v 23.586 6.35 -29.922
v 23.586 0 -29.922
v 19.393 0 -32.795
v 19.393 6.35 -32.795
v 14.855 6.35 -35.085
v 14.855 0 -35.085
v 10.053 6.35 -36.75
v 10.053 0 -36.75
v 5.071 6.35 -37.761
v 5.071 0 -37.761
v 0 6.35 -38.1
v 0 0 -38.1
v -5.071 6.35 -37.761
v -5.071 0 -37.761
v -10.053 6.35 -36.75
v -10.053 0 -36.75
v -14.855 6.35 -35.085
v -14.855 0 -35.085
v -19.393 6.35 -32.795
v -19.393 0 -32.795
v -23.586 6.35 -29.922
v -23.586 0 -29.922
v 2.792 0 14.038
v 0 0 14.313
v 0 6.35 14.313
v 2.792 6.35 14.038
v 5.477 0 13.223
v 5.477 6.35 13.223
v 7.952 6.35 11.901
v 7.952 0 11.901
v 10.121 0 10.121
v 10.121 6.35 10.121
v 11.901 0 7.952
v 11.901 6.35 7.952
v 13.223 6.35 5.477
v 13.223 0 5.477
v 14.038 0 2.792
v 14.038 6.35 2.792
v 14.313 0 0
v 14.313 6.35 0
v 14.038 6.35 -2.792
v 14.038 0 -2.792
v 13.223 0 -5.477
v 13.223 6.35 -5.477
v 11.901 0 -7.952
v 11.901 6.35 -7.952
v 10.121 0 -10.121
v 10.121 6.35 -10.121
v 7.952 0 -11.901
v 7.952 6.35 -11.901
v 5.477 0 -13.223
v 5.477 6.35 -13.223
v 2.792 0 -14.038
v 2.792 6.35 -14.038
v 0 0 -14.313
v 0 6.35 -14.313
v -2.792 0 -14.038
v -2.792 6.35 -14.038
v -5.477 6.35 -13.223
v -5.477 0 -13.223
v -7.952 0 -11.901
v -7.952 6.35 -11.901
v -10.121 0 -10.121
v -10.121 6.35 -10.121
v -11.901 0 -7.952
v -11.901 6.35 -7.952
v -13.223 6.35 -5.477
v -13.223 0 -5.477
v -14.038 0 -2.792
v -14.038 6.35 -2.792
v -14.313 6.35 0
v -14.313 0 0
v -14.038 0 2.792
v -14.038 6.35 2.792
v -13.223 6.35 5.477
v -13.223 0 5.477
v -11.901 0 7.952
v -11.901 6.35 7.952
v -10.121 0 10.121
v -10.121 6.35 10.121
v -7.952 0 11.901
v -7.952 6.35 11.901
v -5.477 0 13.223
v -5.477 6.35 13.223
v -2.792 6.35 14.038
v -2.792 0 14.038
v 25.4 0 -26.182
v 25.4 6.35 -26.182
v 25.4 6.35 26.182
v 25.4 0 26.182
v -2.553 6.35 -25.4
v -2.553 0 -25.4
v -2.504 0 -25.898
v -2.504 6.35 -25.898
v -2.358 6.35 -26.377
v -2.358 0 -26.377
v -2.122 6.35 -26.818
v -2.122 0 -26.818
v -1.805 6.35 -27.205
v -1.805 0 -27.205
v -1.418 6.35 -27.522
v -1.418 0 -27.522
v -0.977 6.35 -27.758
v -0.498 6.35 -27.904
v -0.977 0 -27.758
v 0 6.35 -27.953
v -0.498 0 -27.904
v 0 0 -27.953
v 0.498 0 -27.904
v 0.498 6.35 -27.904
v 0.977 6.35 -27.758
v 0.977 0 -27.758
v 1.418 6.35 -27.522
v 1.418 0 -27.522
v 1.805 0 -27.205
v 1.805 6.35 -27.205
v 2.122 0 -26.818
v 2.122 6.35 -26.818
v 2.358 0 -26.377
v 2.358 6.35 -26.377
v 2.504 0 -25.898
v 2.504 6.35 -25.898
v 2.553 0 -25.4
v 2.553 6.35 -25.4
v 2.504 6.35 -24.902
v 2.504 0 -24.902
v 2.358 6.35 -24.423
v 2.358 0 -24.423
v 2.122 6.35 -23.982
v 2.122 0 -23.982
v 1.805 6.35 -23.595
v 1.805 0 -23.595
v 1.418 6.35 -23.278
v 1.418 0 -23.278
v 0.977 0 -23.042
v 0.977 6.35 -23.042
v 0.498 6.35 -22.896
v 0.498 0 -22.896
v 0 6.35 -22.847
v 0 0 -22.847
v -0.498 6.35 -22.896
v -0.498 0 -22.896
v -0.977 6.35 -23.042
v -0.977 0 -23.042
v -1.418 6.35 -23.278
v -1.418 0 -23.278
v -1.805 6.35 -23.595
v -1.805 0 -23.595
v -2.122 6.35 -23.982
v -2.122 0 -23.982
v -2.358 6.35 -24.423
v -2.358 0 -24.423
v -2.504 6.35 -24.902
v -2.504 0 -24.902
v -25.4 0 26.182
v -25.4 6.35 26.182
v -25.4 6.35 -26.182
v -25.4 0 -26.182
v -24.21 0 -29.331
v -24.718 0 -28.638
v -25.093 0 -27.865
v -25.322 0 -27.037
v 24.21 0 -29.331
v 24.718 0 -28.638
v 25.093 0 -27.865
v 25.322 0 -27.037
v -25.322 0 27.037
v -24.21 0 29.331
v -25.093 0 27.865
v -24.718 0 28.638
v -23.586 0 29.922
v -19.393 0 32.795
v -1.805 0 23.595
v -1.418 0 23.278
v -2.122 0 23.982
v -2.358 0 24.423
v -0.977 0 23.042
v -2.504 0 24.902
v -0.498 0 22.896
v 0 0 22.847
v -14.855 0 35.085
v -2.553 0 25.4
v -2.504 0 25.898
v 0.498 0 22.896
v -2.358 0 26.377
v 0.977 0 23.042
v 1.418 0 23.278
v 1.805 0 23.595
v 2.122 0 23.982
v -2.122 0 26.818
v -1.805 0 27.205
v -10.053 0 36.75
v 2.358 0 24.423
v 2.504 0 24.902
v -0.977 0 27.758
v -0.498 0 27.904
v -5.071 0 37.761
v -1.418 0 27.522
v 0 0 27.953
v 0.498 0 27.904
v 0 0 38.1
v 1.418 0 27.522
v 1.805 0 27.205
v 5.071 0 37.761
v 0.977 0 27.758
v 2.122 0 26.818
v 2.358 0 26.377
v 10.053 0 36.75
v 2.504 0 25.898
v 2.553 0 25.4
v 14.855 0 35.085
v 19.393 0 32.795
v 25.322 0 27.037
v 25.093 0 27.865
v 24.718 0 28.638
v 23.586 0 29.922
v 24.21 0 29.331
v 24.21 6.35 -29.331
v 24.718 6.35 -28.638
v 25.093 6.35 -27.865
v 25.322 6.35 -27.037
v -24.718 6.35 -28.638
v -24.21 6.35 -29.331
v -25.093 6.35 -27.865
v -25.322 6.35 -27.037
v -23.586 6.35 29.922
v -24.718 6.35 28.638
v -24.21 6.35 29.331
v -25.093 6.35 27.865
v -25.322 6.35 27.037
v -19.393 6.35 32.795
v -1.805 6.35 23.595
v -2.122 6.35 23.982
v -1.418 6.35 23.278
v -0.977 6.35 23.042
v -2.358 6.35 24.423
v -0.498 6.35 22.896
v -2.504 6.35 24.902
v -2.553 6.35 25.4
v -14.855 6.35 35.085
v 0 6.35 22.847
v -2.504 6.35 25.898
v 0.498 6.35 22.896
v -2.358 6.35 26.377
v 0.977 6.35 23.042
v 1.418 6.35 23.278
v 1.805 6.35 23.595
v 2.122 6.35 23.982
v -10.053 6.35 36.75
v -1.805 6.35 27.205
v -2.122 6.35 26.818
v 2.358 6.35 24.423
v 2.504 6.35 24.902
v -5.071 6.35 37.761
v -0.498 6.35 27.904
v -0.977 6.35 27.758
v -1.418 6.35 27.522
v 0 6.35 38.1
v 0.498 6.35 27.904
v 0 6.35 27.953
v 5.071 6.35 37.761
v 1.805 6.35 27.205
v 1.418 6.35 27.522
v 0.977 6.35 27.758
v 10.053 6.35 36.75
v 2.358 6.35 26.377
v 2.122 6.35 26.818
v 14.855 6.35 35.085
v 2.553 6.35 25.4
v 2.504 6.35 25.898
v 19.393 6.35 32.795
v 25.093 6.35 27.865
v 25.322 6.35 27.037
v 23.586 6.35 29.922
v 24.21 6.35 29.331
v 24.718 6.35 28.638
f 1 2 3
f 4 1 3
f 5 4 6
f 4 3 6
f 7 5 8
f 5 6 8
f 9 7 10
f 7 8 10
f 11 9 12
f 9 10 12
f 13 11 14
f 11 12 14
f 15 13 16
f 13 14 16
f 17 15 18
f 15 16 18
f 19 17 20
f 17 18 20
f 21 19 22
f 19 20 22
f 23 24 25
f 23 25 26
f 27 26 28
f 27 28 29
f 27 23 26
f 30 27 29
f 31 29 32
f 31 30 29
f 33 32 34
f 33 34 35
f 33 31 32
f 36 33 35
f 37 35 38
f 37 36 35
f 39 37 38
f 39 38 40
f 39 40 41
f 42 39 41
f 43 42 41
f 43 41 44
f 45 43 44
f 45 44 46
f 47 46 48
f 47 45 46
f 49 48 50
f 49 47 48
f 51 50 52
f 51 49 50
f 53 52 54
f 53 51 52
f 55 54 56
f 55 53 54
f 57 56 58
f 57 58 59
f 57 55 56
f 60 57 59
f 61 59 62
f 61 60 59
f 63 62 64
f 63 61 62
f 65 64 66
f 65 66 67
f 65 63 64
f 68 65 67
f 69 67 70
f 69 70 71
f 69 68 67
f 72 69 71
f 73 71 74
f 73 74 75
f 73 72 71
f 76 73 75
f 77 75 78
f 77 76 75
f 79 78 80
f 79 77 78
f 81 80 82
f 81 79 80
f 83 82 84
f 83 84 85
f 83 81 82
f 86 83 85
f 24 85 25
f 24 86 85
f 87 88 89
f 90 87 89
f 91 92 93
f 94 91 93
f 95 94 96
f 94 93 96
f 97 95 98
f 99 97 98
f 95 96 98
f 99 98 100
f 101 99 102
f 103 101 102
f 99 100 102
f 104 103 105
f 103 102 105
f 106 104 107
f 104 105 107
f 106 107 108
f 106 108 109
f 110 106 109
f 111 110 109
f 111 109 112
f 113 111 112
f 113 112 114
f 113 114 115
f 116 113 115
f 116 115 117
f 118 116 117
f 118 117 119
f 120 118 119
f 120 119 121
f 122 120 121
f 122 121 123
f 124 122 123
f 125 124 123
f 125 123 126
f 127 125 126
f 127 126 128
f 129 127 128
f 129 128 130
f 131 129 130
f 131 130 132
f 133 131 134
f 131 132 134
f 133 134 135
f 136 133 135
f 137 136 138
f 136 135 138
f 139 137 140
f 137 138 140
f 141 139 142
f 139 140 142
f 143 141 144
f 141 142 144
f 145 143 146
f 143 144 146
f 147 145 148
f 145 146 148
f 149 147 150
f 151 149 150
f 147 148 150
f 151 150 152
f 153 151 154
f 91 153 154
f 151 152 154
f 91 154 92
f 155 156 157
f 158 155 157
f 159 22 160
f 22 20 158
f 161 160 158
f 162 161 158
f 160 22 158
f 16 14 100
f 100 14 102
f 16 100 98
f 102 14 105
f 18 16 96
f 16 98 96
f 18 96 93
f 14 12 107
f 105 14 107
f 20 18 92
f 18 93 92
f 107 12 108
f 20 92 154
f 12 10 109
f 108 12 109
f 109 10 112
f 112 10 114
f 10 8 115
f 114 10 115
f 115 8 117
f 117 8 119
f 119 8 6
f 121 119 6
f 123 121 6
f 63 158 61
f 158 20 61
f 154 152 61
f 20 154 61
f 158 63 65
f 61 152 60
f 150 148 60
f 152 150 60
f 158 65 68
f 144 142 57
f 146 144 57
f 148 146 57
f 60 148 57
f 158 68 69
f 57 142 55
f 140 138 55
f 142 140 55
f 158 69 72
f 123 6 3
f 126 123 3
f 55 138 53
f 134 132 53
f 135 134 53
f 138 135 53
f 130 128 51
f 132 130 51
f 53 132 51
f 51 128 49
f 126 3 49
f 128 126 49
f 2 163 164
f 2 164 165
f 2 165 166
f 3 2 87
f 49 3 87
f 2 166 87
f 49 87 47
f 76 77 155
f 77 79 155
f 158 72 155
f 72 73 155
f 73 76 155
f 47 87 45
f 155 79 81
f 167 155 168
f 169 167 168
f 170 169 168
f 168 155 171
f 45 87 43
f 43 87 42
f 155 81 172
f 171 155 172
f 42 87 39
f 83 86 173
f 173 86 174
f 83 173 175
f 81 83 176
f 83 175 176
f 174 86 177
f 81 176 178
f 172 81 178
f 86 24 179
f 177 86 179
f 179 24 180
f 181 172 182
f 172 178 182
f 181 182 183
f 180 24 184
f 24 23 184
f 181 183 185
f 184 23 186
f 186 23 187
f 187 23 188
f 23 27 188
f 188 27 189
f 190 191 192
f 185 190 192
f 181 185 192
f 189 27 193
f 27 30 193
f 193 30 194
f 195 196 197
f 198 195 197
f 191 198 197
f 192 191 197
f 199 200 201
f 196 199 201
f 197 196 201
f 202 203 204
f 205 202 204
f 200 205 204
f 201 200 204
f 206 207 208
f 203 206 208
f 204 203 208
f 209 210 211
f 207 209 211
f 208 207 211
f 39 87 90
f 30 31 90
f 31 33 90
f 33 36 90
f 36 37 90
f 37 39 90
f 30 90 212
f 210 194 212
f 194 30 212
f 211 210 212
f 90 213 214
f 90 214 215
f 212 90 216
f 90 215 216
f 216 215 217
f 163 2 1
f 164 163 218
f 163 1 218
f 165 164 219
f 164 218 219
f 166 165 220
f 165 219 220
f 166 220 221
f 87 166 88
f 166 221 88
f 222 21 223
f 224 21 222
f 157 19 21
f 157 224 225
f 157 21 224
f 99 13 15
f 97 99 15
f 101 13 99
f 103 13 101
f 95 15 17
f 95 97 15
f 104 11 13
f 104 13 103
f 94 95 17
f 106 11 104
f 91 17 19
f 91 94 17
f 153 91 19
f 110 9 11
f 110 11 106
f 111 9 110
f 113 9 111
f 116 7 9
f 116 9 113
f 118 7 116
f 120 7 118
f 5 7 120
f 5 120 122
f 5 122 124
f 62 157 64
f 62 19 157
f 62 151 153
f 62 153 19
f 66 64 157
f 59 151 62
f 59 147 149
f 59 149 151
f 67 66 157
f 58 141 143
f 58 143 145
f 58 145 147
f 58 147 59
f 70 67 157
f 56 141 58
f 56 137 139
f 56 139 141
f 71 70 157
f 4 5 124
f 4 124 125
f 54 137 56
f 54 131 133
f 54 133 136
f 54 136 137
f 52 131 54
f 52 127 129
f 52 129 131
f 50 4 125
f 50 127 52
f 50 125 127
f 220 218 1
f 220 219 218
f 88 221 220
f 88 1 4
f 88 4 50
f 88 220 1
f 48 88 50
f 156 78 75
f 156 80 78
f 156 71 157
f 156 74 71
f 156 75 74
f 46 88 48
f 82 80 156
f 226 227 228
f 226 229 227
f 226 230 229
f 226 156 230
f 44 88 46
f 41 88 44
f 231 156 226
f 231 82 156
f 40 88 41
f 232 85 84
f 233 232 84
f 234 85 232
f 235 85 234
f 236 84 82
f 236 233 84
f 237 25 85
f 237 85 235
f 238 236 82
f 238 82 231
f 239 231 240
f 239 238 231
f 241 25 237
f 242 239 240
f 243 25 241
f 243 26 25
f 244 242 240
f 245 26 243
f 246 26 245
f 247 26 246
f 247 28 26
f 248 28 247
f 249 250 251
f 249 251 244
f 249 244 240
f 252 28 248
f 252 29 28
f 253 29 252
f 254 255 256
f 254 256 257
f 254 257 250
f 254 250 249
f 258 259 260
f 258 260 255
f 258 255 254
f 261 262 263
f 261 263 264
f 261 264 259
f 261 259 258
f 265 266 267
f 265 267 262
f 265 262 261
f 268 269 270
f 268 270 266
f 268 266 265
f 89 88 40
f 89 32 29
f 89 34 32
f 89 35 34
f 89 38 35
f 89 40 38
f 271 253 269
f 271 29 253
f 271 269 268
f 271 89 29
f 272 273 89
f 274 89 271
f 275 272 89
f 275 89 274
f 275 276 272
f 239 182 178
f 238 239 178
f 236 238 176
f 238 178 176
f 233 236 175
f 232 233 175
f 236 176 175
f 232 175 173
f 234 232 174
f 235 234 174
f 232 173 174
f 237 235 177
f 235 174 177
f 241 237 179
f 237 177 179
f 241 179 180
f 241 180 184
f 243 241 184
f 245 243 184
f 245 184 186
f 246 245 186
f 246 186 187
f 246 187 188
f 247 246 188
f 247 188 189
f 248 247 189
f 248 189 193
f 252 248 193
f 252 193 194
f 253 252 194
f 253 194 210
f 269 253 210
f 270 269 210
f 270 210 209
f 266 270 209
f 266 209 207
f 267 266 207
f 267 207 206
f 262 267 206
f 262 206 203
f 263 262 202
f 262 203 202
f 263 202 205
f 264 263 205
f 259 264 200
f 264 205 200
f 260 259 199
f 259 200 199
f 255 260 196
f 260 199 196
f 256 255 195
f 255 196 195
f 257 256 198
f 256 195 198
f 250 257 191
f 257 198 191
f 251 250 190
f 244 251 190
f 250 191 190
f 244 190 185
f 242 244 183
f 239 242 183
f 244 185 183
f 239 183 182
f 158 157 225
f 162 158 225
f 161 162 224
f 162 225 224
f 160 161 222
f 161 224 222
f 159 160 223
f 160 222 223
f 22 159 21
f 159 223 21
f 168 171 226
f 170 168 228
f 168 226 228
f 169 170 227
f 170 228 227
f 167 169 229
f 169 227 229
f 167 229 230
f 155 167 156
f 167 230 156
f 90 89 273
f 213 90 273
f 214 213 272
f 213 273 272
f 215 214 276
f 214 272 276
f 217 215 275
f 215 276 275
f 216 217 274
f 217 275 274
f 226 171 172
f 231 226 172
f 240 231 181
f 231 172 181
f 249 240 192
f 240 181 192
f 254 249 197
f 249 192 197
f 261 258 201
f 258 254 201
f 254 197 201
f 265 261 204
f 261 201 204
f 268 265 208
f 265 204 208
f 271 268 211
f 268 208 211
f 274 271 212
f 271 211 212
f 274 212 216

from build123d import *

# Parameters (mm, degrees)
SKETCH1_R              = 38.1
SKETCH1_R_2            = 14.3129
BOSS_EXTRUDE1_DEPTH    = 6.35
SKETCH4_OUTSIDE_W      = 99.79
SKETCH4_OUTSIDE_H      = 99.79
CUT_EXTRUDE1_DEPTH     = 55.254423783
F_10_CLEARANCE_HOLE2_D = 5.1054


with BuildPart() as part:
    # Sketch1 → Boss-Extrude1 (new body)
    with BuildSketch(Plane(origin=(0, 0, 0), x_dir=(1, 0, 0), z_dir=(0, 1, 0))):
        with Locations(Location((0, 0, 0), (0, 0, 270))):
            Circle(SKETCH1_R)
        with Locations(Location((0, 0, 0), (0, 0, 270))):
            Circle(SKETCH1_R_2, mode=Mode.SUBTRACT)
    extrude(amount=BOSS_EXTRUDE1_DEPTH)

    # Sketch4 outside → Cut-Extrude1 (cut, through all)
    with BuildSketch(Plane(origin=(0, 6.35, 0), x_dir=(1, 0, 0), z_dir=(0, 1, 0))):
        Rectangle(SKETCH4_OUTSIDE_W, SKETCH4_OUTSIDE_H)
        with BuildLine():
            Line((-25.4, -26.181720723), (-25.4, 26.181720723))
            ThreePointArc((-25.4, 26.181720723), (-24.922489894, 28.260246127), (-23.585714286, 29.92196654))
            ThreePointArc((-23.585714286, 29.92196654), (0, 38.1), (23.585714286, 29.92196654))
            ThreePointArc((23.585714286, 29.92196654), (24.922489894, 28.260246127), (25.4, 26.181720723))
            Line((25.4, 26.181720723), (25.4, -26.181720723))
            ThreePointArc((25.4, -26.181720723), (24.922489894, -28.260246127), (23.585714286, -29.92196654))
            ThreePointArc((23.585714286, -29.92196654), (0, -38.1), (-23.585714286, -29.92196654))
            ThreePointArc((-23.585714286, -29.92196654), (-24.922489894, -28.260246127), (-25.4, -26.181720723))
        make_face(mode=Mode.SUBTRACT)
    extrude(amount=-CUT_EXTRUDE1_DEPTH, mode=Mode.SUBTRACT)

    # #10 Clearance Hole2 (through all)
    with Locations(Plane(origin=(0, 6.35, 0), x_dir=(1, 0, 0), z_dir=(0, 1, 0))):
        with Locations((0, 25.4), (0, -25.4)):
            Hole(F_10_CLEARANCE_HOLE2_D / 2)


solid = part.part
